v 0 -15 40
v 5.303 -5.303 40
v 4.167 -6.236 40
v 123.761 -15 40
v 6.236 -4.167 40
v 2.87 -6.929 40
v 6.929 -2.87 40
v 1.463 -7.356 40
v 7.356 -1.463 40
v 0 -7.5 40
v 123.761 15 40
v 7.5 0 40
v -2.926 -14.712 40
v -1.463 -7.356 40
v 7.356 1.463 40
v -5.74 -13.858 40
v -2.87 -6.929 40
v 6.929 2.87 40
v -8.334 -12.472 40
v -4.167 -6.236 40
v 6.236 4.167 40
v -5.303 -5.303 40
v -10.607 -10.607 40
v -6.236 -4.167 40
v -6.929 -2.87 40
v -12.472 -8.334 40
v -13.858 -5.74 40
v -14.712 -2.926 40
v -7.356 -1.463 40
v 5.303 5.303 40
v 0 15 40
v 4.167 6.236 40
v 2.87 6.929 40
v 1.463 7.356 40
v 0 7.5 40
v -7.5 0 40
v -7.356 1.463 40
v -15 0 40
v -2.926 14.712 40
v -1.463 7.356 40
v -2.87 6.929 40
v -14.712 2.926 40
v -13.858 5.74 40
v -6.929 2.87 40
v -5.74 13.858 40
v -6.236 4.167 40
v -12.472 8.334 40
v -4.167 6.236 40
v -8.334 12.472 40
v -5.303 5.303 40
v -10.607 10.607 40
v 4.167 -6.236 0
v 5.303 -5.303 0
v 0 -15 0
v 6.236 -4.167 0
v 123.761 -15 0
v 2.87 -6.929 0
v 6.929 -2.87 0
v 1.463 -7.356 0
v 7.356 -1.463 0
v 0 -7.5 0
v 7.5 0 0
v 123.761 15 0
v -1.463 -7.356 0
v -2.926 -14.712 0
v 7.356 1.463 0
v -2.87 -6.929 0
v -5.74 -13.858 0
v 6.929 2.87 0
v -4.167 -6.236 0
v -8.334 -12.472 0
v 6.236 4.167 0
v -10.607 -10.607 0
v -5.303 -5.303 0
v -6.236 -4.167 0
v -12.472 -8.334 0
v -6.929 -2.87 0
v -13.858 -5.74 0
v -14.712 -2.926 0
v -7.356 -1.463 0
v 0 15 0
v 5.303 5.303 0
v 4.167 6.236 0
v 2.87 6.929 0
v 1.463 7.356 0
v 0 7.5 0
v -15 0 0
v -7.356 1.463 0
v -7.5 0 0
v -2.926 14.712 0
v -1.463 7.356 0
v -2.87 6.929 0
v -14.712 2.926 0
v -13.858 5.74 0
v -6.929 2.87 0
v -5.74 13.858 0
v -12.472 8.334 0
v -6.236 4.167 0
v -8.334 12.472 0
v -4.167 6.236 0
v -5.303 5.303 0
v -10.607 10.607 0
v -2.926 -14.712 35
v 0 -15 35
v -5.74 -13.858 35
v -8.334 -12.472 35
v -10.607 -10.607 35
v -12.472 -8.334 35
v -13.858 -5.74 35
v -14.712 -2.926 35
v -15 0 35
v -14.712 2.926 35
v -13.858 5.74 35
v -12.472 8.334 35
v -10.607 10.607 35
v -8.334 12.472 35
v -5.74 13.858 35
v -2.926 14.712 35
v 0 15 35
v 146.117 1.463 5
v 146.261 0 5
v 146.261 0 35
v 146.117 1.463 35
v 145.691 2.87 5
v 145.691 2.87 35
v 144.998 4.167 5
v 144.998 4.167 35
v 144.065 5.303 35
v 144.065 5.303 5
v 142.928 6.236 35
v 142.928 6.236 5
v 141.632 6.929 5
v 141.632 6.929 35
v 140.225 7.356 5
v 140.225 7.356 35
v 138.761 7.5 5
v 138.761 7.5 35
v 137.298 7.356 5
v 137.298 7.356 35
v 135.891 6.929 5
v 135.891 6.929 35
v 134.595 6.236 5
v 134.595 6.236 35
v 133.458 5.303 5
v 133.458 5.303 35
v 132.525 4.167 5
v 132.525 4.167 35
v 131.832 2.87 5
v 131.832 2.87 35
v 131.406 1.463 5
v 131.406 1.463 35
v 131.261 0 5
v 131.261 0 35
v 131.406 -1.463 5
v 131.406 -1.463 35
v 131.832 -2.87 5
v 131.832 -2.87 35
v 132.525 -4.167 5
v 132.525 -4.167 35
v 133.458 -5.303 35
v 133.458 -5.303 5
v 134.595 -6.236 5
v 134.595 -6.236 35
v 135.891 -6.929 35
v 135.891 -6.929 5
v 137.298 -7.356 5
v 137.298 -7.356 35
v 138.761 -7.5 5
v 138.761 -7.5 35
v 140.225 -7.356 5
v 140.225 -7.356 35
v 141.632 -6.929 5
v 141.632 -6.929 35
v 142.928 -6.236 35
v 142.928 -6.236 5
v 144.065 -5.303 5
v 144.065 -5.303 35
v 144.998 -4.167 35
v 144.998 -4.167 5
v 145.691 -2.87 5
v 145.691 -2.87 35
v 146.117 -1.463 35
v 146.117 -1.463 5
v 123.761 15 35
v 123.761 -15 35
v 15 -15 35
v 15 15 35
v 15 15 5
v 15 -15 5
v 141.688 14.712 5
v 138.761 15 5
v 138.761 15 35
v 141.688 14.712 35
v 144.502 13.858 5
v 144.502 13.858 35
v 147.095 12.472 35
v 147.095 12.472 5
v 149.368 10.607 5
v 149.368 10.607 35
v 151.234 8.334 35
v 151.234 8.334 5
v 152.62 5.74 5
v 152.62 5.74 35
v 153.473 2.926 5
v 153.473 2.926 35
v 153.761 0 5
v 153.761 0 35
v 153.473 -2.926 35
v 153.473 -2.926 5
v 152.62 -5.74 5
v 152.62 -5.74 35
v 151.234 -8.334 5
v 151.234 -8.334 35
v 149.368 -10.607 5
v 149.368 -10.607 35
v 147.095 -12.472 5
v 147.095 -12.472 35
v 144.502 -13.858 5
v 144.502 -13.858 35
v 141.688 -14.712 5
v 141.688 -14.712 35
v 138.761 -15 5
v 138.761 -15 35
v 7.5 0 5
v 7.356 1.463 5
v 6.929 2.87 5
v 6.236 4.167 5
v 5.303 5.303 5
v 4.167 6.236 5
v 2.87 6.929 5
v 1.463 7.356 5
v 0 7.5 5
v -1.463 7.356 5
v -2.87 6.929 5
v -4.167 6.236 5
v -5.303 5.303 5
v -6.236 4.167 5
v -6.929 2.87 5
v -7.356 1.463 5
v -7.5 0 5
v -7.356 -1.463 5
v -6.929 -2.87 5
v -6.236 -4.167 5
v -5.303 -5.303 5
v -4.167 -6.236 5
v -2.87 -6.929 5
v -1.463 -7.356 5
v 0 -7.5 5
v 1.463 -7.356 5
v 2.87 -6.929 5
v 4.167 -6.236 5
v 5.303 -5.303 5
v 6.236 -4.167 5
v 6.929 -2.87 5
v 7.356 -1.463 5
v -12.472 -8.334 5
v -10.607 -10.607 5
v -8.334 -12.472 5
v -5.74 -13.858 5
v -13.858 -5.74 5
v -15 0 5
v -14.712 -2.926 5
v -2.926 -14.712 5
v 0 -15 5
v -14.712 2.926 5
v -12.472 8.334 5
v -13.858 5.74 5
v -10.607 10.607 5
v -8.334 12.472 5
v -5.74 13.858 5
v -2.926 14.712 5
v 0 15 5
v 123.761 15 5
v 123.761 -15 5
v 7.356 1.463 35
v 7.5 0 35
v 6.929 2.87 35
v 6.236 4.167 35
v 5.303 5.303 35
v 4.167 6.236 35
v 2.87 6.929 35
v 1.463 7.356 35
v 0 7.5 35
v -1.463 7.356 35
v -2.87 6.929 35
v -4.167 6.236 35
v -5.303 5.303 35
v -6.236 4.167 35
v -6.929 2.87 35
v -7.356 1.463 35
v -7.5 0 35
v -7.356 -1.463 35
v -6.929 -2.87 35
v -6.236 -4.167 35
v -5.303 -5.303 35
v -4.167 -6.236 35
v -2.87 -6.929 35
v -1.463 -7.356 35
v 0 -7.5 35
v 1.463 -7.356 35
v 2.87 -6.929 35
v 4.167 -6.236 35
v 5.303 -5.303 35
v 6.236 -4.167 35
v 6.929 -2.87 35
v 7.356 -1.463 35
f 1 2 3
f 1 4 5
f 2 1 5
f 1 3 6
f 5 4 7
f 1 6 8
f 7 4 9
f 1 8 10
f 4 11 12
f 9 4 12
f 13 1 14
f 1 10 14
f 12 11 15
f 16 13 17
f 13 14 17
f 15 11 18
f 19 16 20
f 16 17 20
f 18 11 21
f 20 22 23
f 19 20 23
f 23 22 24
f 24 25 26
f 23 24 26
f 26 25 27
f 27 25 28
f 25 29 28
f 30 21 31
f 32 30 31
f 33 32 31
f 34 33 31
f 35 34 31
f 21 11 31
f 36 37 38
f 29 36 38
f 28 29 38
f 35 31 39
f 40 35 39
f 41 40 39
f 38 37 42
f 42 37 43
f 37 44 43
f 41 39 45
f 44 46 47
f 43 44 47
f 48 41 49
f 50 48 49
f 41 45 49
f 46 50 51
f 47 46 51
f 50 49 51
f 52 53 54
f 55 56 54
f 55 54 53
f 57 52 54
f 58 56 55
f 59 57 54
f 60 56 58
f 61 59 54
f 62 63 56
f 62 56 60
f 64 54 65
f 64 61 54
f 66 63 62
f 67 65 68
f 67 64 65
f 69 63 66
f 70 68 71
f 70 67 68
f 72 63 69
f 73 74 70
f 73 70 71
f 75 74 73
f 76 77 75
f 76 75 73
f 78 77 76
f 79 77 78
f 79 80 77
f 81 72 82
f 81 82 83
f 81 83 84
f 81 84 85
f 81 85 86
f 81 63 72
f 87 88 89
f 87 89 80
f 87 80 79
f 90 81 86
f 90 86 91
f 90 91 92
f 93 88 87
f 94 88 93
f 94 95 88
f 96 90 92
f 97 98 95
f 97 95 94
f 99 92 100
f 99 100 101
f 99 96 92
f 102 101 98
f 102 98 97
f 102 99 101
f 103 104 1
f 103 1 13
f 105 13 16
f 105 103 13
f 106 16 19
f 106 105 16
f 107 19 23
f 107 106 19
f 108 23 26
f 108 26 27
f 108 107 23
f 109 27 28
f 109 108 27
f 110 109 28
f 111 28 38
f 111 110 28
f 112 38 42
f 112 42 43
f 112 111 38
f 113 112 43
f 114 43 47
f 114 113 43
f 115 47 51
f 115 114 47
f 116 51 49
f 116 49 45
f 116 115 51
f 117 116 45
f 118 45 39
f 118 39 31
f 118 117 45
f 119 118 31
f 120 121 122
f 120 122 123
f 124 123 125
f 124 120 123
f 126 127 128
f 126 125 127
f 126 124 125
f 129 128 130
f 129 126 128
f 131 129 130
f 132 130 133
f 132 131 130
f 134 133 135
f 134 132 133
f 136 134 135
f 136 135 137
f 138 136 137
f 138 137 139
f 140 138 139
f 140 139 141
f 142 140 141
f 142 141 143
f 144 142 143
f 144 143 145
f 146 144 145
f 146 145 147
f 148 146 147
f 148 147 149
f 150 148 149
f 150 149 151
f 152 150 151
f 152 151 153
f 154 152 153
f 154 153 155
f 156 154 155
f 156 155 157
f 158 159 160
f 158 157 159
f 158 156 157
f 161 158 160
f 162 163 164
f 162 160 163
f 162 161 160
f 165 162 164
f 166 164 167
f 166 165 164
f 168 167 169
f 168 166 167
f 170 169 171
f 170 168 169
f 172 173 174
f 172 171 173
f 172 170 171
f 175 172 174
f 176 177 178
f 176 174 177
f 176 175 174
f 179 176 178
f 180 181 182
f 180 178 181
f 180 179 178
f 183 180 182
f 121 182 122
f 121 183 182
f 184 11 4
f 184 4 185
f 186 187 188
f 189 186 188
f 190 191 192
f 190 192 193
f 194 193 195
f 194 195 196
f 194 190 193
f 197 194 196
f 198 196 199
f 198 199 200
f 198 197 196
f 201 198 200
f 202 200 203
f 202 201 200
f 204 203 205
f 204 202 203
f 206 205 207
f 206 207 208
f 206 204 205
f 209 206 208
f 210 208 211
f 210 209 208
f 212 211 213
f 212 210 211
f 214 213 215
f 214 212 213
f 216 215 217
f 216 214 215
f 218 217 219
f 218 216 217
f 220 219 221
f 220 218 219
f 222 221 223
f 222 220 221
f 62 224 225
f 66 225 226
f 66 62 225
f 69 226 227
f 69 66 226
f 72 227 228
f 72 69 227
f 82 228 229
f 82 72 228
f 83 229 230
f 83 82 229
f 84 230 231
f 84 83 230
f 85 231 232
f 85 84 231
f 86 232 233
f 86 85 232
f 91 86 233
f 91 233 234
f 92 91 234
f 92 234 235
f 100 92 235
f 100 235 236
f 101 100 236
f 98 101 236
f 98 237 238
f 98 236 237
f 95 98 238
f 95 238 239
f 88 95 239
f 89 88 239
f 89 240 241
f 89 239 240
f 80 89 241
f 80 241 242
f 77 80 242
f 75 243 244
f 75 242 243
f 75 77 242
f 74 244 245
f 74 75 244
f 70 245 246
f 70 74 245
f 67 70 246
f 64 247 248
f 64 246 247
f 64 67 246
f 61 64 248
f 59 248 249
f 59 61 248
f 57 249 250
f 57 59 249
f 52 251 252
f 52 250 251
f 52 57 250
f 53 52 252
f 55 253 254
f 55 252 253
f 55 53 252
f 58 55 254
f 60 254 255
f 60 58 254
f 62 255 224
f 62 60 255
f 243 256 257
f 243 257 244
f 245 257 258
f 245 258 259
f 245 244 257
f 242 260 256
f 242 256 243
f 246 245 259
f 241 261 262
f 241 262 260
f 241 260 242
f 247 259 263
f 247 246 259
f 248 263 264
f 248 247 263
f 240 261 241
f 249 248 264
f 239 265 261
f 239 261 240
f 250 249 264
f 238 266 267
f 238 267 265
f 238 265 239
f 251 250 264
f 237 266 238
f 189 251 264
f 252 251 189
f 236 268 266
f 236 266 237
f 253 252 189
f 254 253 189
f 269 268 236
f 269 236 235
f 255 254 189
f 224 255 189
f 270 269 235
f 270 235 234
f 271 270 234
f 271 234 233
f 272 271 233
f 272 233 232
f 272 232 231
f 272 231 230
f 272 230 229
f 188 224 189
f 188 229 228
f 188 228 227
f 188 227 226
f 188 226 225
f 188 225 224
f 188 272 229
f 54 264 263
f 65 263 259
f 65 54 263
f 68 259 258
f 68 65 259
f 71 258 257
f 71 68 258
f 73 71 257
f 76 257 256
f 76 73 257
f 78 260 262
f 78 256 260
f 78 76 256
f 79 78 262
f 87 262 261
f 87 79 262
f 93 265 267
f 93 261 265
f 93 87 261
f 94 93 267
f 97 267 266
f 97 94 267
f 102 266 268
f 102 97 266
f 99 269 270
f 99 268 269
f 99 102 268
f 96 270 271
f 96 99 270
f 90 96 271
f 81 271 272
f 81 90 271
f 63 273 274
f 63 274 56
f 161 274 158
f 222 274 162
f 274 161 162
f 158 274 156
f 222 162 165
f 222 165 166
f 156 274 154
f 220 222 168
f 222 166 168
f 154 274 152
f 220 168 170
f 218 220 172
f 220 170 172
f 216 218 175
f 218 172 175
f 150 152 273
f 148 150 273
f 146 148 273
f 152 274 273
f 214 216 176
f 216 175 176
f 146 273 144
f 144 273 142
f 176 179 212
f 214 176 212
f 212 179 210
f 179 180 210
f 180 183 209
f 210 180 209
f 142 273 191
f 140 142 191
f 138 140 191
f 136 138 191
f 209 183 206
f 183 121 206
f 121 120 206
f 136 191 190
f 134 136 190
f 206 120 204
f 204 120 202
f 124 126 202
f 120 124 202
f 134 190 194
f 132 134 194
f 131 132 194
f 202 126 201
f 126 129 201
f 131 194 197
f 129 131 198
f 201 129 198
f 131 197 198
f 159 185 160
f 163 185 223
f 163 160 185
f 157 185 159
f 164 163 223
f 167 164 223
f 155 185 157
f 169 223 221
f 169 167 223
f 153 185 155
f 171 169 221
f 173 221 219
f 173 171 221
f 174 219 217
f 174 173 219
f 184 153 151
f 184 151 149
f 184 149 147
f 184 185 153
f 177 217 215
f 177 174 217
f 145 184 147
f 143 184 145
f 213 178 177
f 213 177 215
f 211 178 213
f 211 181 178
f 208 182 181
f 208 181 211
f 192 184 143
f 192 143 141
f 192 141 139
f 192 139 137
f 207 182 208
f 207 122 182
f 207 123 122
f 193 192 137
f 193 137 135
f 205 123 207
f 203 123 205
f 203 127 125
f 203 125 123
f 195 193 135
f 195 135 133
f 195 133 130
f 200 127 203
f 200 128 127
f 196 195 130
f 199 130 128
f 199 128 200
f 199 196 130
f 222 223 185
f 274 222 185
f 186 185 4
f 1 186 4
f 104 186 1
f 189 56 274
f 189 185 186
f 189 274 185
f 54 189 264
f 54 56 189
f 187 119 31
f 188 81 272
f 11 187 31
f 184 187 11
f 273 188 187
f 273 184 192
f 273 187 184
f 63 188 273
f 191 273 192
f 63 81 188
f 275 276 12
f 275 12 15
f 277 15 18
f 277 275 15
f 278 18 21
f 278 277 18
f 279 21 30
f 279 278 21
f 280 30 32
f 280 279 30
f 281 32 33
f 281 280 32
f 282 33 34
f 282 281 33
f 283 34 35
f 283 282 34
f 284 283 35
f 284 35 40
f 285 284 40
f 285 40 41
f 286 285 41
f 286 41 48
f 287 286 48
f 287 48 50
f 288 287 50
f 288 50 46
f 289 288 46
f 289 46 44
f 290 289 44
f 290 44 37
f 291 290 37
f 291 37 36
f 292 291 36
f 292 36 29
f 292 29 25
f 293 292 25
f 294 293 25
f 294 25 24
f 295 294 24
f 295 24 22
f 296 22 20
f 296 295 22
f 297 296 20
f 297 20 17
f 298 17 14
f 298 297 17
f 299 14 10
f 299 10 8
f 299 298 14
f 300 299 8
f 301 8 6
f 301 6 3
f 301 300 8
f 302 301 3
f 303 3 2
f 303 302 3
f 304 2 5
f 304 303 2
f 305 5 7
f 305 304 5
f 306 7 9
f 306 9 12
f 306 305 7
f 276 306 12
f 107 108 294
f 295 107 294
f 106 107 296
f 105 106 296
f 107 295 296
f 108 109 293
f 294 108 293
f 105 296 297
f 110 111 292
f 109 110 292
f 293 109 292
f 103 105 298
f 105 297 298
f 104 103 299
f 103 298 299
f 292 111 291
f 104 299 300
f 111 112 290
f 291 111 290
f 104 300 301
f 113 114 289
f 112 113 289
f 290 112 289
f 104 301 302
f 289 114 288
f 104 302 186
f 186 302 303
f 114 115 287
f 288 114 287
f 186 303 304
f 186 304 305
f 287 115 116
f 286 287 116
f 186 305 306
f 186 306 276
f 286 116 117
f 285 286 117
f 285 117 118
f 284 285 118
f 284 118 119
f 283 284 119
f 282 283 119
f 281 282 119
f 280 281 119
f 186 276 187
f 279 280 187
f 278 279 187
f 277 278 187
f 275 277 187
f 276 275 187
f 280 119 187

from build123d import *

# Parameters (mm, degrees)
SKETCH1_R           = 7.5
BOSS_EXTRUDE1_DEPTH = 40
SKETCH2_W           = 30
SKETCH2_H           = 30
SKETCH2_H_2         = 5
CUT_EXTRUDE1_DEPTH  = 162.686727154


with BuildPart() as part:
    # Sketch1 → Boss-Extrude1 (new body)
    with BuildSketch(Plane.XY):
        with BuildLine():
            Line((0, 15), (138.761496278, 15))
            ThreePointArc((138.761496278, 15), (153.761496278, 0), (138.761496278, -15))
            Line((138.761496278, -15), (0, -15))
            ThreePointArc((0, -15), (-15, 0), (0, 15))
        make_face()
        Circle(SKETCH1_R, mode=Mode.SUBTRACT)
        with Locations((138.761496278, 0)):
            Circle(SKETCH1_R, mode=Mode.SUBTRACT)
    extrude(amount=BOSS_EXTRUDE1_DEPTH)

    # Sketch2 → Cut-Extrude1 (cut, through all)
    with BuildSketch(Plane(origin=(0, 15, 0), x_dir=(1, 0, 0), z_dir=(0, 1, 0))):
        with Locations((0, -20)):
            Rectangle(SKETCH2_W, SKETCH2_H)
        with Locations((138.761496278, -2.5)):
            Rectangle(SKETCH2_W, SKETCH2_H_2)
        with Locations((138.761496278, -37.5)):
            Rectangle(SKETCH2_W, SKETCH2_H_2)
    extrude(amount=-CUT_EXTRUDE1_DEPTH, mode=Mode.SUBTRACT)


solid = part.part
